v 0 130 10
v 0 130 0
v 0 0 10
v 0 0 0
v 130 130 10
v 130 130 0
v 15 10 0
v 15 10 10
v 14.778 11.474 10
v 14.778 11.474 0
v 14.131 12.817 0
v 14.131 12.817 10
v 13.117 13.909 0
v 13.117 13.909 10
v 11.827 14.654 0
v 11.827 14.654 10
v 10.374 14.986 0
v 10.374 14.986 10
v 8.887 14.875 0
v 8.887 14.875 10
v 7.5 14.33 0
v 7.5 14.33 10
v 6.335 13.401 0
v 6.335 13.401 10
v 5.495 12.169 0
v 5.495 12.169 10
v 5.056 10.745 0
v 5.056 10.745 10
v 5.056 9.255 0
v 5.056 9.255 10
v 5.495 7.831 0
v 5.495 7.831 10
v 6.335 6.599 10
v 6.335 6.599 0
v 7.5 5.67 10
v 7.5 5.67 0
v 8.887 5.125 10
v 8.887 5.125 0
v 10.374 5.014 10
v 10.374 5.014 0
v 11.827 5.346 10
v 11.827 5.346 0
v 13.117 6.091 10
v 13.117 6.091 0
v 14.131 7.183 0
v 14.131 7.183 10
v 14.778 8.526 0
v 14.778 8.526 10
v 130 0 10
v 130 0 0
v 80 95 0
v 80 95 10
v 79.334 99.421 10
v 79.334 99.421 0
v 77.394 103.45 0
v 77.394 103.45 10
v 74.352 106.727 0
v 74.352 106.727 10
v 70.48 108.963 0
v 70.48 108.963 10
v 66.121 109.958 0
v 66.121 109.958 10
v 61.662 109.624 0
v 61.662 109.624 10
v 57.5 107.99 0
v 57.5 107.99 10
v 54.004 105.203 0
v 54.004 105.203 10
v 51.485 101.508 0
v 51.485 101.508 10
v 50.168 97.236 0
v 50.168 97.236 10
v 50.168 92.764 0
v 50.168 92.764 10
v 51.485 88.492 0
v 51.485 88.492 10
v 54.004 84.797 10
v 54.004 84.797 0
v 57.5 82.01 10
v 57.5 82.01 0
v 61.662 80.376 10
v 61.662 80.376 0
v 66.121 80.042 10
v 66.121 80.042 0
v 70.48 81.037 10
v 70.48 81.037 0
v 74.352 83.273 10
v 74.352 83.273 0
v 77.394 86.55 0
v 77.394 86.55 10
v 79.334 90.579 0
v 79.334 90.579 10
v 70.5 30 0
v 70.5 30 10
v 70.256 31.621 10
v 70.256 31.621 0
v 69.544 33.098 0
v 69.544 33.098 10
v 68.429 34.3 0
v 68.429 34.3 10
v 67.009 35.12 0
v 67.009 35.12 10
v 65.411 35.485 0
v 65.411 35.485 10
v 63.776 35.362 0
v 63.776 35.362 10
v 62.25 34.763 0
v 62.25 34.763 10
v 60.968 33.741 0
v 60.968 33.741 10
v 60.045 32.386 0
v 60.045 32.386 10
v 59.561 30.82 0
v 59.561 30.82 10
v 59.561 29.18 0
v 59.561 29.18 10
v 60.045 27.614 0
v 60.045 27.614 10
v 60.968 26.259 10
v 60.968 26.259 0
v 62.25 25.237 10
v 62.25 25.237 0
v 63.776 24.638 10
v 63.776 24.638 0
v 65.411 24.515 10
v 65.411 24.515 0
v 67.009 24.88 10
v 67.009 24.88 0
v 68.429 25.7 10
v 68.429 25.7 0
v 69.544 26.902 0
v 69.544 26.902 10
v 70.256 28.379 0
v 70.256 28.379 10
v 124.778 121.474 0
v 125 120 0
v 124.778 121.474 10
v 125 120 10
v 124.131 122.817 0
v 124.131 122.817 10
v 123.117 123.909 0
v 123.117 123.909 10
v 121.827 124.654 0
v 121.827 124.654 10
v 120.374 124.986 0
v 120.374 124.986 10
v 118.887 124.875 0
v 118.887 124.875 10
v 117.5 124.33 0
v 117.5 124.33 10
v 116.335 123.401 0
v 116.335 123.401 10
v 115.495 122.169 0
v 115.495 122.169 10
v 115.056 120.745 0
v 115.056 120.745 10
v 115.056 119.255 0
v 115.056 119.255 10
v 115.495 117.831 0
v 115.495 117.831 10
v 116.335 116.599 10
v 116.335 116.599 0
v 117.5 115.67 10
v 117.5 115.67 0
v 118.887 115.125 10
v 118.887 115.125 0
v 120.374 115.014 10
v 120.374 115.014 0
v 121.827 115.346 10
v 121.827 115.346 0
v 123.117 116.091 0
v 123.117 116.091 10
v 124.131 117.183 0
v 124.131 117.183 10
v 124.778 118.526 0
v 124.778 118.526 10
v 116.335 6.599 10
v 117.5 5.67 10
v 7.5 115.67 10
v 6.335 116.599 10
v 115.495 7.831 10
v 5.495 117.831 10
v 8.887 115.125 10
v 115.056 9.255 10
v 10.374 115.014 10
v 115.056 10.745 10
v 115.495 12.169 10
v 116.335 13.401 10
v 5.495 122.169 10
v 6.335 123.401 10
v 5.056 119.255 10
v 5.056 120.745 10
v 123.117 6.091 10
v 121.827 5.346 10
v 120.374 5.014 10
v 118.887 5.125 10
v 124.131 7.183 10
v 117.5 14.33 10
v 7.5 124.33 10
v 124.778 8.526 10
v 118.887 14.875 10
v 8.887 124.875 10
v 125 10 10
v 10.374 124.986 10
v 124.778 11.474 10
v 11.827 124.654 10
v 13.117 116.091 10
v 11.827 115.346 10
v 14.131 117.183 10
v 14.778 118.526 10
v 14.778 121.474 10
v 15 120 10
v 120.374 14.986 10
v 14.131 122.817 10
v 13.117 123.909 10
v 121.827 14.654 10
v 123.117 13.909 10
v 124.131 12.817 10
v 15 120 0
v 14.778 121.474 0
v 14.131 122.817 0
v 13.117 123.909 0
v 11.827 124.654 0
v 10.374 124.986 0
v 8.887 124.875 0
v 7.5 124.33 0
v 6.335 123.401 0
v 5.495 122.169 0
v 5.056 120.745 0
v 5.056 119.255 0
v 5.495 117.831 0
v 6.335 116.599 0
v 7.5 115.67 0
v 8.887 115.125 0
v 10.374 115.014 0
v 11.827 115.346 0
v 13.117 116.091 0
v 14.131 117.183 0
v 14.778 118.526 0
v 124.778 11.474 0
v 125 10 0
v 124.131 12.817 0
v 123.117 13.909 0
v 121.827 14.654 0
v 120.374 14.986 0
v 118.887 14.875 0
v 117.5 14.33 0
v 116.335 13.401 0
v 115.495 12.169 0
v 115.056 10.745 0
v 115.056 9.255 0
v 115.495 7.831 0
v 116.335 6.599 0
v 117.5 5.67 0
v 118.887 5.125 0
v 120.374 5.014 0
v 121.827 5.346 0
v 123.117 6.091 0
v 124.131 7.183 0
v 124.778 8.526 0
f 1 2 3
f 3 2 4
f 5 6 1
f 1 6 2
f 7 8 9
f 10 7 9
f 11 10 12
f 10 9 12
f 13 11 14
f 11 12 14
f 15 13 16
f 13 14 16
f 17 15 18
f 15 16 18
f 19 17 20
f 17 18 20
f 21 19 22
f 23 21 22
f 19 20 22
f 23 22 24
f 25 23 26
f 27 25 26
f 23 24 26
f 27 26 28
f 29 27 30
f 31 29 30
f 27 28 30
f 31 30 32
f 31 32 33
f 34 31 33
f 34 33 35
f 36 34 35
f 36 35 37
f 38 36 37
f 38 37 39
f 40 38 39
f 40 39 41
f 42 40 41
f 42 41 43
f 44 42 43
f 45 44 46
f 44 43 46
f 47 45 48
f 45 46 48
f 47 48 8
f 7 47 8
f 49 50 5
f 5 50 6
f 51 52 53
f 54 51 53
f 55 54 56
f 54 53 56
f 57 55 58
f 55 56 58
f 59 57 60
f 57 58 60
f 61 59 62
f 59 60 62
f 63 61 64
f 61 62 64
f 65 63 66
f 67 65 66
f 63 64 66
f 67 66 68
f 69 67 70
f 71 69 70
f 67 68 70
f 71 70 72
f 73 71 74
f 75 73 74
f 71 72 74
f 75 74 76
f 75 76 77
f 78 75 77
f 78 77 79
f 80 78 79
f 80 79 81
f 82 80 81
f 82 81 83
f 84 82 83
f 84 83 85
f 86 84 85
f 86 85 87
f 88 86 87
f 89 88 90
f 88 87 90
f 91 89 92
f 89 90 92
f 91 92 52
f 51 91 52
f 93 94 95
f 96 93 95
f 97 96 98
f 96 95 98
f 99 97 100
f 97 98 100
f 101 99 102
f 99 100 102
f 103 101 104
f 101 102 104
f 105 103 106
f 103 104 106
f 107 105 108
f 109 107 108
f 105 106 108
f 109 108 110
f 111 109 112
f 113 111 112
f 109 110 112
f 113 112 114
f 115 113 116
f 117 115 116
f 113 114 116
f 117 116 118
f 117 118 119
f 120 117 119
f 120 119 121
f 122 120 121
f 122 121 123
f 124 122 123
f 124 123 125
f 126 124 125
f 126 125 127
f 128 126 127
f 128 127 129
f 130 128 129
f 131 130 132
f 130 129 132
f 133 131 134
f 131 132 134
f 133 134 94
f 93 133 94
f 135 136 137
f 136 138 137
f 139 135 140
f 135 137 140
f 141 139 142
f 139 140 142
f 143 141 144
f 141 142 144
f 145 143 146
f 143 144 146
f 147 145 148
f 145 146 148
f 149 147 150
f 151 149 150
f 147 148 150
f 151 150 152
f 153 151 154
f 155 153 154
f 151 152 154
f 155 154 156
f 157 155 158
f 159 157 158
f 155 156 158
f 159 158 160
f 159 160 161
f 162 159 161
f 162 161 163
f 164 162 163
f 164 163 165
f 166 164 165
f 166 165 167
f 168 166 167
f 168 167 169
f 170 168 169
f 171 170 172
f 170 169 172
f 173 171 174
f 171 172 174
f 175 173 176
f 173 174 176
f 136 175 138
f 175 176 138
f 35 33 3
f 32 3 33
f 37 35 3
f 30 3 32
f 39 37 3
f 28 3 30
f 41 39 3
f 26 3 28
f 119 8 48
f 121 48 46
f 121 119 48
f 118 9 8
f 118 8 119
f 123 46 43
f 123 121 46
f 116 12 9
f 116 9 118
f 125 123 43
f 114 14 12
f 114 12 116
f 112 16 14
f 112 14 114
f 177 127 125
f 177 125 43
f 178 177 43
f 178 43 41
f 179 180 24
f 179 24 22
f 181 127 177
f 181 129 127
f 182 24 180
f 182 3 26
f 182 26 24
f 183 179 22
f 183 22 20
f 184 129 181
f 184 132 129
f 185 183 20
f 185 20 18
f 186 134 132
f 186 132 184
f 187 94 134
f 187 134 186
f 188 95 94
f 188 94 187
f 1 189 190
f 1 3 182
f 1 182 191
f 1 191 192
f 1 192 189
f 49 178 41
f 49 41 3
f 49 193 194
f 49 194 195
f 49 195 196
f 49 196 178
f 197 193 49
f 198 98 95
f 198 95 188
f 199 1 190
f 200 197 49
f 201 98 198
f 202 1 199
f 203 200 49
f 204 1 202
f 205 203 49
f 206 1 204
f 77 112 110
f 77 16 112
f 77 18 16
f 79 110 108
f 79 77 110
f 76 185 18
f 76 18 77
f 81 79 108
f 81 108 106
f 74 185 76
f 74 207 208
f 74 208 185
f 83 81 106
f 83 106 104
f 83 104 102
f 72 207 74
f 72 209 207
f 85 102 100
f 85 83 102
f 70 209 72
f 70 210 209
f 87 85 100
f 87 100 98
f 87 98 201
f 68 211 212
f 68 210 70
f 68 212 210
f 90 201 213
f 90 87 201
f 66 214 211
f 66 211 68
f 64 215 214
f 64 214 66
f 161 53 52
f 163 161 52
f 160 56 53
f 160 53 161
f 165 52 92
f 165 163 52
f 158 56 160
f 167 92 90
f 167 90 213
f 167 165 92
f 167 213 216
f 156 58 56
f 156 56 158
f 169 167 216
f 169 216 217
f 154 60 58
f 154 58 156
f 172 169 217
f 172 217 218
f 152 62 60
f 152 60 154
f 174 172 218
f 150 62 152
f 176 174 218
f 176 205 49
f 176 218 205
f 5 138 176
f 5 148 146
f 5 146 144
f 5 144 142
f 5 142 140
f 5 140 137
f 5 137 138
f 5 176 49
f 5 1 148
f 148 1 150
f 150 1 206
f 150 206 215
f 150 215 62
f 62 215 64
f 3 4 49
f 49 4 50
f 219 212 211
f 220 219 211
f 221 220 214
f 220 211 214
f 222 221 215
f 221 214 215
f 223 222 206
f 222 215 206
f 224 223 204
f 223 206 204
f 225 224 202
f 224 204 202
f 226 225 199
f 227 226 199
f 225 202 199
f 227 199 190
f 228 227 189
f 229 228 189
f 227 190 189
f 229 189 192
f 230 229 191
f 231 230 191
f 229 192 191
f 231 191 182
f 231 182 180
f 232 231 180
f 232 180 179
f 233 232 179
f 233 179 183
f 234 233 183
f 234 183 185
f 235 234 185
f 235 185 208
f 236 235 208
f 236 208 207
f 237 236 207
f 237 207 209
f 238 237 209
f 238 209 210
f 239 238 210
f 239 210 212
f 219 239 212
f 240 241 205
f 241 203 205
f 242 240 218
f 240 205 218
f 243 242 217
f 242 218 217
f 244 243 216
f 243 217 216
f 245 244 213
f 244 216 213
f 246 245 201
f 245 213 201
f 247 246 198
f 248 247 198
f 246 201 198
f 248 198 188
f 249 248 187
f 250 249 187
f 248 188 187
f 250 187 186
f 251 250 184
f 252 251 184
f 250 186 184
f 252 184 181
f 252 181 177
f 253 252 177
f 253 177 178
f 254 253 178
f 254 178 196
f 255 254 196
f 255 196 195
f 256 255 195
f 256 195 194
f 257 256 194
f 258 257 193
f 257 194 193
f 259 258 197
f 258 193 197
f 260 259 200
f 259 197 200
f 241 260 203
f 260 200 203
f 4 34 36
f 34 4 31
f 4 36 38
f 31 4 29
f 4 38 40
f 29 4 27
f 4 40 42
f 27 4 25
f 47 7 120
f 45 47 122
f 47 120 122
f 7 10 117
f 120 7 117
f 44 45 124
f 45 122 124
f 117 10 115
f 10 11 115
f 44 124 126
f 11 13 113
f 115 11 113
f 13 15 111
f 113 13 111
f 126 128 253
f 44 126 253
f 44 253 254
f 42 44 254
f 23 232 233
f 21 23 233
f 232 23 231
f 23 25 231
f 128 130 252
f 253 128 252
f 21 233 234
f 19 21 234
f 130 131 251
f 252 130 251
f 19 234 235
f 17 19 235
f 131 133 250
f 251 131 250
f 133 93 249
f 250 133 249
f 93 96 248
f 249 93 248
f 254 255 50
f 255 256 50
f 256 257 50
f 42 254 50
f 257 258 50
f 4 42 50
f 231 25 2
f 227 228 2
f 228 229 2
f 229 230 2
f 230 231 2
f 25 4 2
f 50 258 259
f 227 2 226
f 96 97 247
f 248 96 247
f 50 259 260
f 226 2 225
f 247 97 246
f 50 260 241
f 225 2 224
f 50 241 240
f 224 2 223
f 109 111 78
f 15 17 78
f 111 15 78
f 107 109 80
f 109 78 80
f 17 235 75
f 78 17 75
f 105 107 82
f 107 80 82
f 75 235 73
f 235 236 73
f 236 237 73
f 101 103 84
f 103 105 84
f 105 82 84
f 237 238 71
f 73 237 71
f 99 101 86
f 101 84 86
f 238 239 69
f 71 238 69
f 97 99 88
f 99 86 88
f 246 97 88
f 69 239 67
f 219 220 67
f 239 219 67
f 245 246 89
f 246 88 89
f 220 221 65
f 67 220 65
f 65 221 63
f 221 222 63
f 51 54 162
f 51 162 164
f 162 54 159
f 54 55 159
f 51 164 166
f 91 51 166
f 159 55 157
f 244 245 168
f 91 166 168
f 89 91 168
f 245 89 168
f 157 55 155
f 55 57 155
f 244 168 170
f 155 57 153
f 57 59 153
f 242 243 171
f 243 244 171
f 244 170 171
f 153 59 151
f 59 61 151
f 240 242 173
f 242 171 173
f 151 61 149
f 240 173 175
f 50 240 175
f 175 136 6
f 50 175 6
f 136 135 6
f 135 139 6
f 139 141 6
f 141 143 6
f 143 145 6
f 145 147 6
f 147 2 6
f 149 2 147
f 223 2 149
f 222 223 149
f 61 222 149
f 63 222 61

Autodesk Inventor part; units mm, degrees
ref_plane "YZ Plane" through (0, 0, 0) normal (1, 0, 0) x (0, 1, 0)
ref_plane "XZ Plane" through (0, 0, 0) normal (0, 1, 0) x (-1, 0, 0)
ref_plane "XY Plane" through (0, 0, 0) normal (0, 0, 1) x (1, 0, 0)
sketch "Sketch1" plane through (0, 0, 0) normal (0, 0, 1) x (1, 0, 0)
  line L0 (0, 0) -> (130, 0)
  line L1 (130, 0) -> (130, 130)
  line L2 (130, 130) -> (0, 130)
  line L3 (0, 130) -> (0, 0)
  line L4 (0, 130) -> (19.05, 130)
  line L5 (0, 130) -> (3.175, 130)
  dimension "d0" = 130
  dimension "d1" = 130
extrude "Extrusion1" add sketch "Sketch1" along normal blind 10
sketch "Sketch2" plane through (0, 0, 10) normal (0, 0, 1) x (1, 0, 0)
  line L0 (130, 130) -> (0, 130) projected
  line L1 (0, 130) -> (10, 130)
  line L2 (10, 130) -> (10, 10)
  line L3 (10, 10) -> (120, 10)
  line L4 (120, 10) -> (120, 120)
  line L5 (120, 120) -> (10, 120)
  circle A0 centre (10, 120) radius 5
  circle A1 centre (120, 120) radius 5
  circle A2 centre (120, 10) radius 5
  circle A3 centre (10, 10) radius 5
  point P0 (0, 0)
  dimension "d4" = 10
  dimension "d5" = 120
  dimension "d6" = 110
  dimension "d7" = 110
  dimension "d8" = 110
  dimension "d9" = 10
  dimension "d10" = 10
  dimension "d11" = 10
  dimension "d12" = 10
extrude "Extrusion2" cut sketch "Sketch2" against normal through all contours A0 L5 L2 | L2 A0 | L5 A0 L2 | A1 L4 L5 | L5 L4 A1 | A3 L3 L2 | L2 L3 A3 | A2 L3 L4 | L4 L3 A2
sketch "Sketch3" plane through (0, 0, 10) normal (0, 0, 1) x (1, 0, 0)
  line L0 (0, 0) -> (65, 0)
  line L1 (0, 0) -> (130, 0) projected
  line L2 (65, 0) -> (65, 30)
  circle A0 centre (65, 30) radius 5.5
  line L3 (130, 130) -> (0, 130) projected
  line L4 (0, 130) -> (65, 130)
  line L5 (65, 130) -> (65, 95)
  circle A1 centre (65, 95) radius 15
  dimension "d15" = 65
  dimension "d16" = 30
  dimension "d17" = 11
  dimension "d18" = 65
  dimension "d19" = 35
  dimension "d20" = 30
extrude "Extrusion3" cut sketch "Sketch3" against normal blind 10
properties part number "BOTTON"
